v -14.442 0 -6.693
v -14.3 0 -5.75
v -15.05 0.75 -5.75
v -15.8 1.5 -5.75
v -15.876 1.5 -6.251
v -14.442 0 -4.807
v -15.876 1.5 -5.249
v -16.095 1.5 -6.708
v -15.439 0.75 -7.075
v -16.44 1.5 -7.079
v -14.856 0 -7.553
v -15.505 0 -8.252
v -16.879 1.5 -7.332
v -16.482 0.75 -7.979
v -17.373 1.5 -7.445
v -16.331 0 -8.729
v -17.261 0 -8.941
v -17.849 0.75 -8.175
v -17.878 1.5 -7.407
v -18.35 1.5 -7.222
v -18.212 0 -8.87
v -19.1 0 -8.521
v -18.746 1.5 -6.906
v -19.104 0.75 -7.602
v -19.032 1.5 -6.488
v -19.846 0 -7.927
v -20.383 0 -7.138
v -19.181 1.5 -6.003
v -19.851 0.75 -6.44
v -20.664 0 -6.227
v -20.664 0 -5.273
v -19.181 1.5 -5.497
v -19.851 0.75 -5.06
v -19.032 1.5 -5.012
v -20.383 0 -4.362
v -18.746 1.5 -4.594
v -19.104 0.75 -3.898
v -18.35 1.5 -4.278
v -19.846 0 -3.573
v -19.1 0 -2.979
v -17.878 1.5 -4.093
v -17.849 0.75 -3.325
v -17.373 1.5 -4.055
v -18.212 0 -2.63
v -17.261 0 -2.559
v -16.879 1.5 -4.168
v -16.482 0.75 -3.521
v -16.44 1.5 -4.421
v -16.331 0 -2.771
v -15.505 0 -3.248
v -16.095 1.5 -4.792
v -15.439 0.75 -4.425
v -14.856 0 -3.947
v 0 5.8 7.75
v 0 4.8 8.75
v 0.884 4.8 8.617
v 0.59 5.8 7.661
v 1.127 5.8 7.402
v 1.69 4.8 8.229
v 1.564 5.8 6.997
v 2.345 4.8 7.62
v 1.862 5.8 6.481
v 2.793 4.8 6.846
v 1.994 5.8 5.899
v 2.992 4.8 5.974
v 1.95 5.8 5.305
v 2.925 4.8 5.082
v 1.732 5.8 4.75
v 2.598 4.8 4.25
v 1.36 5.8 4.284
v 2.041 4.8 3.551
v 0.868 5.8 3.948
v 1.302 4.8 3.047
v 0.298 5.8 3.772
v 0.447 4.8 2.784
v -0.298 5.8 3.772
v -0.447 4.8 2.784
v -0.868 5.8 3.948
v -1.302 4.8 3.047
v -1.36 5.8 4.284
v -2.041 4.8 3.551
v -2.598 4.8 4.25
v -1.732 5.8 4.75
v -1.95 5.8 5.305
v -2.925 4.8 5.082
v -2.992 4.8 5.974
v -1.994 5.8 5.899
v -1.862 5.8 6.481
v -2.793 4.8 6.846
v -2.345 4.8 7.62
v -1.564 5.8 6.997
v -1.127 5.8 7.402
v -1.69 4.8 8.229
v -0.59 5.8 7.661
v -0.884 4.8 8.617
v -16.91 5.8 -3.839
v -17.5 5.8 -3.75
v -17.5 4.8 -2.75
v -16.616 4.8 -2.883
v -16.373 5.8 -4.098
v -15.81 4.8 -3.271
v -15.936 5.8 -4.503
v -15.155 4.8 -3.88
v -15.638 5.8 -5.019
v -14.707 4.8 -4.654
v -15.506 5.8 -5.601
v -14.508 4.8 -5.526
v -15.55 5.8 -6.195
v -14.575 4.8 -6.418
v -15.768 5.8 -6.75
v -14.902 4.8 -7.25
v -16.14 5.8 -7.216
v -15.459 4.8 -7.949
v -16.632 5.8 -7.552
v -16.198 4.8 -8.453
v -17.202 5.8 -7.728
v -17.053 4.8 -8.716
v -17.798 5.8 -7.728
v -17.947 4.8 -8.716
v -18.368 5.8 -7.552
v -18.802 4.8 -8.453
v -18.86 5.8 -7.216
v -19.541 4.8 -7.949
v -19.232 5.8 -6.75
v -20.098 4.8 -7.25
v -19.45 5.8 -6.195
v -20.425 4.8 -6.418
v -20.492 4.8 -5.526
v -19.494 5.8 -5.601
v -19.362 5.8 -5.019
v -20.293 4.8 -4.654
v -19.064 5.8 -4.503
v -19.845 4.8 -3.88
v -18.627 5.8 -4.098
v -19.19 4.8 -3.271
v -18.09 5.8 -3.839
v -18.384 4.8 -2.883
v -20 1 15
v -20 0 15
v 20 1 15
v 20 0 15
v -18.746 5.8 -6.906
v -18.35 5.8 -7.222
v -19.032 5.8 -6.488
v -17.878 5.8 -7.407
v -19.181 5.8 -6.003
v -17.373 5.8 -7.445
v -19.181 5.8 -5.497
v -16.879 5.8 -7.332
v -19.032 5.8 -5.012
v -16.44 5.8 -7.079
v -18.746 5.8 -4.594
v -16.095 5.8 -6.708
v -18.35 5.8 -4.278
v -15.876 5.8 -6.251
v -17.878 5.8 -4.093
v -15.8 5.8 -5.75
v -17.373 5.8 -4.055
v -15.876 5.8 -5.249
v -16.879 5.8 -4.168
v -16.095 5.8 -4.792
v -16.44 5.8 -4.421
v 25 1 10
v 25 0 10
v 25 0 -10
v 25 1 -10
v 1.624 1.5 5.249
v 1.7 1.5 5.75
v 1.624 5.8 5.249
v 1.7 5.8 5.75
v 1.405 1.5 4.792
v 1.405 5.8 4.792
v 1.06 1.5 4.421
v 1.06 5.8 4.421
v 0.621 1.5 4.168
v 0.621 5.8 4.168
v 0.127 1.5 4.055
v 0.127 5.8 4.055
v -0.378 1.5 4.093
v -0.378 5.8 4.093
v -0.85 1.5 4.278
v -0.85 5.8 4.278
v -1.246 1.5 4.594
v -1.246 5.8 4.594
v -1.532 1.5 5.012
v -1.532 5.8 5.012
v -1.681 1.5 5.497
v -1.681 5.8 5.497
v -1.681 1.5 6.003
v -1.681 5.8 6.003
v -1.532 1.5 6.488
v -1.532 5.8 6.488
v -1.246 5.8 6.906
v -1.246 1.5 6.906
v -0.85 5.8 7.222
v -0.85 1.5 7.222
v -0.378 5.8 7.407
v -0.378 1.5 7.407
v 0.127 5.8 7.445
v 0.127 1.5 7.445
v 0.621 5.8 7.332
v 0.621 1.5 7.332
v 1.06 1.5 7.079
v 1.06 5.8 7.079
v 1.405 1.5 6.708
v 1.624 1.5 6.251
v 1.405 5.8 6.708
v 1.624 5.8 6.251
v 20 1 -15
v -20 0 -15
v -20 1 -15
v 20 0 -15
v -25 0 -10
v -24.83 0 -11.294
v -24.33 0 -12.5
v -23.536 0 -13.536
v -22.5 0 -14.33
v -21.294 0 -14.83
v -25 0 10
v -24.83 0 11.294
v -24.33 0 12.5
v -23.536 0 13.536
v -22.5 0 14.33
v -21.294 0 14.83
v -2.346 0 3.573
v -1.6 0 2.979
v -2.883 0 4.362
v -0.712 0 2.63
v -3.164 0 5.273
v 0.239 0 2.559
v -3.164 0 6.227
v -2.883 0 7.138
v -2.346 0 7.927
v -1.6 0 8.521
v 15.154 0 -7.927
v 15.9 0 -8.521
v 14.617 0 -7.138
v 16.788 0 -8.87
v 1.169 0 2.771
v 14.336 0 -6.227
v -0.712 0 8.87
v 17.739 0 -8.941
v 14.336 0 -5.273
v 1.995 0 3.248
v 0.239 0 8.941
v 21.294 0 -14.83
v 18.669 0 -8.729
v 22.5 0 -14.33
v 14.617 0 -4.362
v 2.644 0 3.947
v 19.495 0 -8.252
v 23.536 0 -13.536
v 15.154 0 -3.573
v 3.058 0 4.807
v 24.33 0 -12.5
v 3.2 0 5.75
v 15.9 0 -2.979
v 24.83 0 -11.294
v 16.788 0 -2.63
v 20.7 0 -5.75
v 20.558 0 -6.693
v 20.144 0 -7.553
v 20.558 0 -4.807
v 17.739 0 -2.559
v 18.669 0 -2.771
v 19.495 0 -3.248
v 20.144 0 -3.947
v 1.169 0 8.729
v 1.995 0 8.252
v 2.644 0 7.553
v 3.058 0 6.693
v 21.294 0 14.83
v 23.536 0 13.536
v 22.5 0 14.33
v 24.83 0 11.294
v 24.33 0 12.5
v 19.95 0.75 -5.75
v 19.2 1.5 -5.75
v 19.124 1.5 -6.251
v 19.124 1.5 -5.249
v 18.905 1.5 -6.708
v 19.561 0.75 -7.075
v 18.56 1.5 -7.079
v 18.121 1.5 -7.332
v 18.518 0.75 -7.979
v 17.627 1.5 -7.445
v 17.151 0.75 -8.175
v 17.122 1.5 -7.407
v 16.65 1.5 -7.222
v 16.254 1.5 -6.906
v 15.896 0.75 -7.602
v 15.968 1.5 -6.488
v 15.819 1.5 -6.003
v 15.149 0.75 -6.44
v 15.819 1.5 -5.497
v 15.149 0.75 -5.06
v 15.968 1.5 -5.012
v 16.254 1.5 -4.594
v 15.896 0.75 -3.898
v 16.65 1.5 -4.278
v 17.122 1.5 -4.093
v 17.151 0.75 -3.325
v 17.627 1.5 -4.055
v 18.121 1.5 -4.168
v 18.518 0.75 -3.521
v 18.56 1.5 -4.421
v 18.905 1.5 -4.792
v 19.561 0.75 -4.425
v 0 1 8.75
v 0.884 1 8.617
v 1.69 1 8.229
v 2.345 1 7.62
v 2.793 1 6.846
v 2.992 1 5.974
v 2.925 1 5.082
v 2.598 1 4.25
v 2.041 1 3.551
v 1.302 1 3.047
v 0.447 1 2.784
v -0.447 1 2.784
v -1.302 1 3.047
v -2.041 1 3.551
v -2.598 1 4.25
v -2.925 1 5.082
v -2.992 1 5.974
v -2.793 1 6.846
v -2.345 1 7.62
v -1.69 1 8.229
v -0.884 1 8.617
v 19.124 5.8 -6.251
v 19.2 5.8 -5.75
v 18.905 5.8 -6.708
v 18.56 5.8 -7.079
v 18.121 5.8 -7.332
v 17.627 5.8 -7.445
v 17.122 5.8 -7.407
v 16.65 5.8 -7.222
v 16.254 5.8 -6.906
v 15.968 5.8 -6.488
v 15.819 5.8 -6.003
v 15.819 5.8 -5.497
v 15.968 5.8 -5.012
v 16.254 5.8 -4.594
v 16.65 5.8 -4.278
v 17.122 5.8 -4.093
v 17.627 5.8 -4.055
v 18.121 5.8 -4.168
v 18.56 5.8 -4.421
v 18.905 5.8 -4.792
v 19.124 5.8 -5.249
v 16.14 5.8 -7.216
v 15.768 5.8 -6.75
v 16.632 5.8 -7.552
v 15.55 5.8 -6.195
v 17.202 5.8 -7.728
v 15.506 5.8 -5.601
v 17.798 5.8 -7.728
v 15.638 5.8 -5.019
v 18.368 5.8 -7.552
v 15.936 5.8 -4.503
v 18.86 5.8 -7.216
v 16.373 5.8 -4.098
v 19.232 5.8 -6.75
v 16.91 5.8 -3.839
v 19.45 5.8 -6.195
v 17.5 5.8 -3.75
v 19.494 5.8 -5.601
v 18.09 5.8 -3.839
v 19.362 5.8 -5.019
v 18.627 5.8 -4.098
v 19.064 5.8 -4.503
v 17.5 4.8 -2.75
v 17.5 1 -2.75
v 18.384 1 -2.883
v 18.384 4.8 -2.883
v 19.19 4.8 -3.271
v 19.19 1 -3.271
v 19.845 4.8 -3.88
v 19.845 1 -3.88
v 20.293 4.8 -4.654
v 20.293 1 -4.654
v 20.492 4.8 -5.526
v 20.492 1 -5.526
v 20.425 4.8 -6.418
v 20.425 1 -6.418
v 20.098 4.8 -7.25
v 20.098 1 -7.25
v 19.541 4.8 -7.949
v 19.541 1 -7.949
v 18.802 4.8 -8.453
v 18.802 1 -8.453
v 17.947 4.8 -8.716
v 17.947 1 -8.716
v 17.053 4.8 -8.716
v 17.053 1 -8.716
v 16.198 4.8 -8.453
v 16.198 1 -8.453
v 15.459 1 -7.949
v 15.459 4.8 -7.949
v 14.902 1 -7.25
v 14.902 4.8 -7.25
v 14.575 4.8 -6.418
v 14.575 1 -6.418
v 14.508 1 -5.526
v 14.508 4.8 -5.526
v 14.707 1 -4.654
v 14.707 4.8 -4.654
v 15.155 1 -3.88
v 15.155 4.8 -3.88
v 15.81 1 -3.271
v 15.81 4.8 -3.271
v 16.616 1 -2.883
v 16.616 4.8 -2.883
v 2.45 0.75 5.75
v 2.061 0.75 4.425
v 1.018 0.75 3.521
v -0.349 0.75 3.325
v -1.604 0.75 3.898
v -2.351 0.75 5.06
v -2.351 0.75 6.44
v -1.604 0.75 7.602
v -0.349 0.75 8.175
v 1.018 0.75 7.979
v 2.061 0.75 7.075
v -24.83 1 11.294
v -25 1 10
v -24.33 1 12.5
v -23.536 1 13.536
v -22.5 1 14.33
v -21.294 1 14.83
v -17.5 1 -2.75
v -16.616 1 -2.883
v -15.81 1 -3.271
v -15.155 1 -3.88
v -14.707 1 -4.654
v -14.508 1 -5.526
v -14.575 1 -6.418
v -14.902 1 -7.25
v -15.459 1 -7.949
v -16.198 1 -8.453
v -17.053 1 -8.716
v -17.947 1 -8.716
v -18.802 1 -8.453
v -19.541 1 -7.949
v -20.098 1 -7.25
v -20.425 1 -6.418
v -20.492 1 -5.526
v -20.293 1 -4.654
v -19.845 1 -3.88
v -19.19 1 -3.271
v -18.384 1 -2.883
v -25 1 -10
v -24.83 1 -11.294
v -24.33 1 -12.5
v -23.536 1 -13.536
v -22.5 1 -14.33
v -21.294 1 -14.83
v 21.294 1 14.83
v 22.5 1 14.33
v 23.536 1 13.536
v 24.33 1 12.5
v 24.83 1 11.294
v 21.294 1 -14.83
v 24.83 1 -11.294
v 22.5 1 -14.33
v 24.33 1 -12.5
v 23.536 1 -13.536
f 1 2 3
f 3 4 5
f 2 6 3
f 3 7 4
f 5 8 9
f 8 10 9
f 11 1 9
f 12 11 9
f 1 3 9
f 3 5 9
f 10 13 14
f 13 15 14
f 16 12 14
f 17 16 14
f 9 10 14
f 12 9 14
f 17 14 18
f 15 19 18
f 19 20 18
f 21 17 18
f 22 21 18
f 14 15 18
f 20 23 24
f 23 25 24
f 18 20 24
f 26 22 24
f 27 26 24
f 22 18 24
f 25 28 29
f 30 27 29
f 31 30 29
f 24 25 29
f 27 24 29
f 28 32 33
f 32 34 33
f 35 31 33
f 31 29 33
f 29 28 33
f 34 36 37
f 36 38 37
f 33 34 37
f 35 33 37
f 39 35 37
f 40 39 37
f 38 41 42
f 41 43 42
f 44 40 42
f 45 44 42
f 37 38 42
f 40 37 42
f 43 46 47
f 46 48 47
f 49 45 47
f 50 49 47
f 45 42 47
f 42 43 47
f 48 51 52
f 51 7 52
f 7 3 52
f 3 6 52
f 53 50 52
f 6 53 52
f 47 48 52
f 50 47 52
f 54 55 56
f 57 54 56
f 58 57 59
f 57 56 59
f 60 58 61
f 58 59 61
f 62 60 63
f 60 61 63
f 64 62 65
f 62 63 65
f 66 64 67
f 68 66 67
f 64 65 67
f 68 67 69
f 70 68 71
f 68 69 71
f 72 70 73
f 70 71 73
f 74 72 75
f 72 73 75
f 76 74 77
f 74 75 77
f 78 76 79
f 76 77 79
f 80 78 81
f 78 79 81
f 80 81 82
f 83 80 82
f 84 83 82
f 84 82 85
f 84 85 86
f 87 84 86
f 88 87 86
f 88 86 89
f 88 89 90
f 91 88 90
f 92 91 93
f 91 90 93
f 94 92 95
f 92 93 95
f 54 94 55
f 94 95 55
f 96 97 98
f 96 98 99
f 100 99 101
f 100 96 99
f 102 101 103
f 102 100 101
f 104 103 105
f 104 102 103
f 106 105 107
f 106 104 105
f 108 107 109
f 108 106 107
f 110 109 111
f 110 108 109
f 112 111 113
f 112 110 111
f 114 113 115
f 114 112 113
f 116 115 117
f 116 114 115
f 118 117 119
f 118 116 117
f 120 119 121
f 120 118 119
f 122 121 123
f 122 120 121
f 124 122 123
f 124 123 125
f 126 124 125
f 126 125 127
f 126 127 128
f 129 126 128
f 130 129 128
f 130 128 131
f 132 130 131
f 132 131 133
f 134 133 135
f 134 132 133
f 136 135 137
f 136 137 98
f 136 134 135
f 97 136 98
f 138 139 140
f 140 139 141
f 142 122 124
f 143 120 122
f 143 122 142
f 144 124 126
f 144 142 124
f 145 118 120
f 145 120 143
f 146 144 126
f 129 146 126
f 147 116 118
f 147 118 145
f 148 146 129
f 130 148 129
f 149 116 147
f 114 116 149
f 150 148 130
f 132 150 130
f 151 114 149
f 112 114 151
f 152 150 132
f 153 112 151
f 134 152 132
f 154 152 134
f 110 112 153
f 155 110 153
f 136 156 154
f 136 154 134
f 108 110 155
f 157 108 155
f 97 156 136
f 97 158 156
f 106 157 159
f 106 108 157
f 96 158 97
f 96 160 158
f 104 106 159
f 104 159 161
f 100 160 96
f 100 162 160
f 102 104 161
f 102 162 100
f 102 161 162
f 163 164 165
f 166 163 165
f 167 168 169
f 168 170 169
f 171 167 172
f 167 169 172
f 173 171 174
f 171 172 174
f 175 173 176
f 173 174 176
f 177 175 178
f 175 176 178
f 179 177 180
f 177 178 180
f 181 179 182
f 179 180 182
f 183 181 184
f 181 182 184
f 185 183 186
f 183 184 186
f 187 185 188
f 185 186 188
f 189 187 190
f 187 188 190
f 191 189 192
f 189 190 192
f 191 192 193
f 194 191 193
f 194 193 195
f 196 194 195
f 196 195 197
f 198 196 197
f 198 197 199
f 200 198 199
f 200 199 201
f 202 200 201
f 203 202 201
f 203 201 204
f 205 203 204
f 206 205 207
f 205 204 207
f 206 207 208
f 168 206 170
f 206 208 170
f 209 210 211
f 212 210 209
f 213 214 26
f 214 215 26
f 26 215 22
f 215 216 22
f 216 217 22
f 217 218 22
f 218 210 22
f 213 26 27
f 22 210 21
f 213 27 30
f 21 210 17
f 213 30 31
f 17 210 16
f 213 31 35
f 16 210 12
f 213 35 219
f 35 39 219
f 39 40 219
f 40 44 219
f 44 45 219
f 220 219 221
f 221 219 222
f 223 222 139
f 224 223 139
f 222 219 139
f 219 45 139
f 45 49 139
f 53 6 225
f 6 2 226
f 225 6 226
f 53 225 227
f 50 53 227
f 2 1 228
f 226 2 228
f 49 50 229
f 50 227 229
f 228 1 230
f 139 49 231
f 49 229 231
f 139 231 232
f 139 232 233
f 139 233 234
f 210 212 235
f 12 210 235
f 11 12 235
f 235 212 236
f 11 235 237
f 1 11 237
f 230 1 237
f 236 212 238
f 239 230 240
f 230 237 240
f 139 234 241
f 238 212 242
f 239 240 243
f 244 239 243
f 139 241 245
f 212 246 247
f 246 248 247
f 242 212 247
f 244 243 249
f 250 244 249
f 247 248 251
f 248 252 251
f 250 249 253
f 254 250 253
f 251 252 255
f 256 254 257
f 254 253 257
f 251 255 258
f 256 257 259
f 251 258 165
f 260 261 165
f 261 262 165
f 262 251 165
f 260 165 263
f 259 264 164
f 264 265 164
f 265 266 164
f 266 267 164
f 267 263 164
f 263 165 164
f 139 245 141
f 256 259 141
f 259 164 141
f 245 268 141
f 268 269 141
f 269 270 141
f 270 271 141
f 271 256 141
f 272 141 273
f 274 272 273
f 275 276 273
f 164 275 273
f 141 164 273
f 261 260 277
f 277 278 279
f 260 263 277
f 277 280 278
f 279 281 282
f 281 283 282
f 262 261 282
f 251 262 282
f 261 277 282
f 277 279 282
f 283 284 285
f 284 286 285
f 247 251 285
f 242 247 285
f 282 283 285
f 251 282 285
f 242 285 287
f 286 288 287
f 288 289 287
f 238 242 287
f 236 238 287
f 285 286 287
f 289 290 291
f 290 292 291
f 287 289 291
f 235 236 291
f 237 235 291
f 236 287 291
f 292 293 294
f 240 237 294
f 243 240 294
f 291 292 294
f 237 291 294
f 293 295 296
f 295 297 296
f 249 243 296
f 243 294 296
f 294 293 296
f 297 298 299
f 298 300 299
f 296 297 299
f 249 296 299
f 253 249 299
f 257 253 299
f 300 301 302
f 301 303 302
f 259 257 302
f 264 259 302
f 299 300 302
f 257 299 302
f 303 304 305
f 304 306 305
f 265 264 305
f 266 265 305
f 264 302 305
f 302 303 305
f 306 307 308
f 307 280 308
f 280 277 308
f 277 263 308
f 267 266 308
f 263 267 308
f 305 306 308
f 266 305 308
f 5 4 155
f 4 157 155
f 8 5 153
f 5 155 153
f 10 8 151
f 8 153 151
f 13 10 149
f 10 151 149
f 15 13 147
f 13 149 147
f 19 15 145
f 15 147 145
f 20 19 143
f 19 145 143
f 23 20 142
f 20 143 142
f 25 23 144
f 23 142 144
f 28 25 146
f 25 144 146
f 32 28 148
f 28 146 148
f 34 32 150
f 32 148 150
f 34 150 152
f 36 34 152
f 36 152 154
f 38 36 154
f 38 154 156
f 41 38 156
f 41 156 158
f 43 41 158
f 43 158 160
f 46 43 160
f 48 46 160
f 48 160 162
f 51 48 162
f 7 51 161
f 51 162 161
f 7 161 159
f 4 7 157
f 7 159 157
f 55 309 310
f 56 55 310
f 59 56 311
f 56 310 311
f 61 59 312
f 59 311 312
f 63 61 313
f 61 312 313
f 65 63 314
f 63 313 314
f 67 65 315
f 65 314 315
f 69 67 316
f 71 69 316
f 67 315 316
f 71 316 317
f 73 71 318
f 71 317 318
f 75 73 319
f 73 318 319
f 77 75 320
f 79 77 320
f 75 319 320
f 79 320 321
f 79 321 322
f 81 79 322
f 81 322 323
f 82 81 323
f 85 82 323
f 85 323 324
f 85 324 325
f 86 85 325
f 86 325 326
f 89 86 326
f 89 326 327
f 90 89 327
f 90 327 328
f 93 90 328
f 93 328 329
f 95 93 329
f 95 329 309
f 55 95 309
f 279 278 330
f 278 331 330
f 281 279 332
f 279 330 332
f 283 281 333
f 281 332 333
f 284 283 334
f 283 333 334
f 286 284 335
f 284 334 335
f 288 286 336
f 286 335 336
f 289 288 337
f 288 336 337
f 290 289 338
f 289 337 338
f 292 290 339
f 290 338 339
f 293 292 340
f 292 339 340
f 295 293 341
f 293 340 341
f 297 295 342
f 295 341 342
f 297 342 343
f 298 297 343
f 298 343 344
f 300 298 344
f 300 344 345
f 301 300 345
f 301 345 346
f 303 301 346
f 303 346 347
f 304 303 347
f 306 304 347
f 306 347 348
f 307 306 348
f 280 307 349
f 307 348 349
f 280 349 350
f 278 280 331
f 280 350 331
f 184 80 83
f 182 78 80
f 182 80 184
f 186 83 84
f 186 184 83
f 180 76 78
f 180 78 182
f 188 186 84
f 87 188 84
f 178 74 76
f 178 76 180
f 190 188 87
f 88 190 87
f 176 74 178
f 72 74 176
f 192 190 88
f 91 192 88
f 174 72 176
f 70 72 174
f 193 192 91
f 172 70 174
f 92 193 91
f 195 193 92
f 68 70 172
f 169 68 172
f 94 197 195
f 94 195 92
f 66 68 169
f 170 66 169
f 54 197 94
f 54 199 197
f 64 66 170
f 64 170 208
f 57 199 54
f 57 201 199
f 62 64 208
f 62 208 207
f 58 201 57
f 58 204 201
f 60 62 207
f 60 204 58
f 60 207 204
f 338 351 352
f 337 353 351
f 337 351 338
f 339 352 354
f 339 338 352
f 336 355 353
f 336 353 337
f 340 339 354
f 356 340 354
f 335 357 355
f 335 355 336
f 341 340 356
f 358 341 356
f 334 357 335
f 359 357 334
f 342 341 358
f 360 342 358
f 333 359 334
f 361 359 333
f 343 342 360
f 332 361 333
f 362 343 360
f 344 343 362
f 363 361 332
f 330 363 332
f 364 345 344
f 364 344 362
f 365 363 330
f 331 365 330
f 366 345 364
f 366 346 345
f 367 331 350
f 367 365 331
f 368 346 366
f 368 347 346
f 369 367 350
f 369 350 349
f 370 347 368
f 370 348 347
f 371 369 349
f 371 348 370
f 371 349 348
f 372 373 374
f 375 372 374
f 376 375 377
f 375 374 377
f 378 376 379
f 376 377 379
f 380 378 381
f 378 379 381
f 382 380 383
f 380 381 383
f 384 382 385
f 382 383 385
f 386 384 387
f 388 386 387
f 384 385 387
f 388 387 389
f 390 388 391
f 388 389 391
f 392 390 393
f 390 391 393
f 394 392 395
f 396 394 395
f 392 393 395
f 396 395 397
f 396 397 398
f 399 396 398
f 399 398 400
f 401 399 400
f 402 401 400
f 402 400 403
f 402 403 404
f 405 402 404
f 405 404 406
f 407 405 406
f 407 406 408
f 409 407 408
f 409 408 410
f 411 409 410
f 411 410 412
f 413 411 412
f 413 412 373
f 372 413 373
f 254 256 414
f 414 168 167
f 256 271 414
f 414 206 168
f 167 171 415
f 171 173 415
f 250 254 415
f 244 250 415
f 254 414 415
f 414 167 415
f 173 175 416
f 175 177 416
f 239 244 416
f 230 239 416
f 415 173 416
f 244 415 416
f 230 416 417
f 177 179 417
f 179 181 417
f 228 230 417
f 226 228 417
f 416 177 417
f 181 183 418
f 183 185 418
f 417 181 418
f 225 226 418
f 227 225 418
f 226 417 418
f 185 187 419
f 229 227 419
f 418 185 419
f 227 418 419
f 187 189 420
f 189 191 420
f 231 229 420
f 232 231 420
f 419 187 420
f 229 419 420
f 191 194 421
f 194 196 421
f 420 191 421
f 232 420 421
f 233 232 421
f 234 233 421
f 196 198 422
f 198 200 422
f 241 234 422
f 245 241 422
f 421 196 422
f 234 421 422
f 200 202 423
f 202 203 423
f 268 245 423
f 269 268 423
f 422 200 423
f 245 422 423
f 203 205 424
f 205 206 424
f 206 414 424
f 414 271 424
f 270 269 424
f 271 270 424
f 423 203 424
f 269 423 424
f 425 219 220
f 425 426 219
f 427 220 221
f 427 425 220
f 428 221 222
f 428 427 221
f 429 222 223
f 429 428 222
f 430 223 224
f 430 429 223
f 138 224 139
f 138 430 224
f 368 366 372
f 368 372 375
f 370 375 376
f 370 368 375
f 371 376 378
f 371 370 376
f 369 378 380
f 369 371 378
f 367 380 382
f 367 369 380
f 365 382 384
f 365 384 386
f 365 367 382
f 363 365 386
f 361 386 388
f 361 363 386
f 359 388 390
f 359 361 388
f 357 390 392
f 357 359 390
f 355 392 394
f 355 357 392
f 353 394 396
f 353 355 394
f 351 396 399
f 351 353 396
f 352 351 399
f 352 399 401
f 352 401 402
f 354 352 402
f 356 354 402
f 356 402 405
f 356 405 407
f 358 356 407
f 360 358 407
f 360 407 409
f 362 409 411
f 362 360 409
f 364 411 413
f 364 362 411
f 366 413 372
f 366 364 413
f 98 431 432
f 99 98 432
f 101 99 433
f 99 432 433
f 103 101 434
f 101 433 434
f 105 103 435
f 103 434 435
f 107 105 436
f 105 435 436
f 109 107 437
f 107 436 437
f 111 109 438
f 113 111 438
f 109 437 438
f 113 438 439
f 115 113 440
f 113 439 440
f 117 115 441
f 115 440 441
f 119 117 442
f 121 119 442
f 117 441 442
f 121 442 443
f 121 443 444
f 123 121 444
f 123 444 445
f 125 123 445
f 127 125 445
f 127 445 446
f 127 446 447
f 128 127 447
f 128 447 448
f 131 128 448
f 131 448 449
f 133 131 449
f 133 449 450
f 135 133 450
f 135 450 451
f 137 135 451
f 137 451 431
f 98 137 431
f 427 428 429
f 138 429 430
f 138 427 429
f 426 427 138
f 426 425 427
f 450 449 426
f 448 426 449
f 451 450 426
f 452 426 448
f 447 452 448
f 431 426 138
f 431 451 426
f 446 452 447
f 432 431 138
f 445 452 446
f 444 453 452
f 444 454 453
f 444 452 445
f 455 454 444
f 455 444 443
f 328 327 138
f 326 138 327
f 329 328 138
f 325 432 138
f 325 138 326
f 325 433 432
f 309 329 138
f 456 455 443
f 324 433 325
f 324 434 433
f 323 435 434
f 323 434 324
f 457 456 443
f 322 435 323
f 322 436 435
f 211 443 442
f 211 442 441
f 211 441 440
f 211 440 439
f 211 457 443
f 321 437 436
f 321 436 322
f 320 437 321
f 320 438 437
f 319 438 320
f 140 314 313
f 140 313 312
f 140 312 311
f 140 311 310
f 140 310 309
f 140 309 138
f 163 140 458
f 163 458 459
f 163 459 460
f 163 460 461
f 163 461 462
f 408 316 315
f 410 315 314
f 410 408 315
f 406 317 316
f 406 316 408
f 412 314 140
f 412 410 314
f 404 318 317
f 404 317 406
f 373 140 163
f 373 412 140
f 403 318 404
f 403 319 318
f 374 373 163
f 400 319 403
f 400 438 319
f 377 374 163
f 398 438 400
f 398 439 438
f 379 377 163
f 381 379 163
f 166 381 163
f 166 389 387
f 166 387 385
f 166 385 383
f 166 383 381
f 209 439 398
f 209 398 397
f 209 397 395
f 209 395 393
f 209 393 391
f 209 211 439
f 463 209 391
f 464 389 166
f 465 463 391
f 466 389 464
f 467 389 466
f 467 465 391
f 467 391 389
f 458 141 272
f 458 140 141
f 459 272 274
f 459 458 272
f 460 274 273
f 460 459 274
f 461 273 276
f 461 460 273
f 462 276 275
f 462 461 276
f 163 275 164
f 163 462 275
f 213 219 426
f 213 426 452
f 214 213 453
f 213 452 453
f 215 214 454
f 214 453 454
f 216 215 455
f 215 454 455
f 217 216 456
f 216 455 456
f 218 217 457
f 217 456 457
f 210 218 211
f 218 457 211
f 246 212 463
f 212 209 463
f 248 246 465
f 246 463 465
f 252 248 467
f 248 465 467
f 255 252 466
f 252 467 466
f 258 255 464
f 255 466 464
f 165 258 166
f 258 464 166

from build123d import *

# Parameters (mm, degrees)
SKETCH_1_W                   = 50
SKETCH_1_H                   = 30
EXTRUDE_1_DEPTH              = 1
SKETCH_1_3_R                 = 3
EXTRUDE_2_DEPTH              = 5.8
HOLE_WIZARD_M3_1_D           = 3.4
HOLE_WIZARD_M3_1_DEPTH       = 7.5
HOLE_WIZARD_M3_1_CSINK_D     = 6.4
HOLE_WIZARD_M3_1_CSINK_ANGLE = 90
HOLE_WIZARD_M3_1_TIP         = 1.021463052
CHAMFER_1_SIZE               = 1
FILLET_1_R                   = 5


with BuildPart() as part:
    # 草图1 → 凸台-拉伸1 (new body)
    with BuildSketch(Plane(origin=(0, 0, 0), x_dir=(1, 0, 0), z_dir=(0, 1, 0))):
        Rectangle(SKETCH_1_W, SKETCH_1_H)
    extrude(amount=EXTRUDE_1_DEPTH)

    # 草图1<3> → 凸台-拉伸2 (add)
    with BuildSketch(Plane(origin=(0, 0, 0), x_dir=(1, 0, 0), z_dir=(0, 1, 0))):
        with Locations((-17.5, 5.75)):
            Circle(SKETCH_1_3_R)
        with Locations((17.5, 5.75)):
            Circle(SKETCH_1_3_R)
        with Locations((0, -5.75)):
            Circle(SKETCH_1_3_R)
    extrude(amount=EXTRUDE_2_DEPTH)

    # M3 平头机械螺钉的锥形沉头孔1
    with Locations(Plane(origin=(0, 0, 0), x_dir=(-1, 0, 0), z_dir=(0, -1, 0))):
        with Locations((-17.5, 5.75), (0, -5.75), (17.5, 5.75)):
            CounterSinkHole(HOLE_WIZARD_M3_1_D / 2, HOLE_WIZARD_M3_1_CSINK_D / 2, depth=HOLE_WIZARD_M3_1_DEPTH, counter_sink_angle=HOLE_WIZARD_M3_1_CSINK_ANGLE)
            with Locations((0, 0, -(HOLE_WIZARD_M3_1_DEPTH + HOLE_WIZARD_M3_1_TIP / 2))):  # 118° drill point
                Cone(0, HOLE_WIZARD_M3_1_D / 2, HOLE_WIZARD_M3_1_TIP, mode=Mode.SUBTRACT)

    # 倒角1
    chamfer_1_edges = [part.edges().sort_by_distance(p)[0] for p in [
        (-20.5, 5.8, -5.75),
        (-3, 5.8, 5.75),
        (14.5, 5.8, -5.75),
    ]]
    chamfer(chamfer_1_edges, length=CHAMFER_1_SIZE)

    # 圆角1
    fillet_1_edges = [part.edges().sort_by_distance(p)[0] for p in [
        (-25, 0.5, 15),
        (-25, 0.5, -15),
        (25, 0.5, -15),
        (25, 0.5, 15),
    ]]
    fillet(fillet_1_edges, radius=FILLET_1_R)


solid = part.part
